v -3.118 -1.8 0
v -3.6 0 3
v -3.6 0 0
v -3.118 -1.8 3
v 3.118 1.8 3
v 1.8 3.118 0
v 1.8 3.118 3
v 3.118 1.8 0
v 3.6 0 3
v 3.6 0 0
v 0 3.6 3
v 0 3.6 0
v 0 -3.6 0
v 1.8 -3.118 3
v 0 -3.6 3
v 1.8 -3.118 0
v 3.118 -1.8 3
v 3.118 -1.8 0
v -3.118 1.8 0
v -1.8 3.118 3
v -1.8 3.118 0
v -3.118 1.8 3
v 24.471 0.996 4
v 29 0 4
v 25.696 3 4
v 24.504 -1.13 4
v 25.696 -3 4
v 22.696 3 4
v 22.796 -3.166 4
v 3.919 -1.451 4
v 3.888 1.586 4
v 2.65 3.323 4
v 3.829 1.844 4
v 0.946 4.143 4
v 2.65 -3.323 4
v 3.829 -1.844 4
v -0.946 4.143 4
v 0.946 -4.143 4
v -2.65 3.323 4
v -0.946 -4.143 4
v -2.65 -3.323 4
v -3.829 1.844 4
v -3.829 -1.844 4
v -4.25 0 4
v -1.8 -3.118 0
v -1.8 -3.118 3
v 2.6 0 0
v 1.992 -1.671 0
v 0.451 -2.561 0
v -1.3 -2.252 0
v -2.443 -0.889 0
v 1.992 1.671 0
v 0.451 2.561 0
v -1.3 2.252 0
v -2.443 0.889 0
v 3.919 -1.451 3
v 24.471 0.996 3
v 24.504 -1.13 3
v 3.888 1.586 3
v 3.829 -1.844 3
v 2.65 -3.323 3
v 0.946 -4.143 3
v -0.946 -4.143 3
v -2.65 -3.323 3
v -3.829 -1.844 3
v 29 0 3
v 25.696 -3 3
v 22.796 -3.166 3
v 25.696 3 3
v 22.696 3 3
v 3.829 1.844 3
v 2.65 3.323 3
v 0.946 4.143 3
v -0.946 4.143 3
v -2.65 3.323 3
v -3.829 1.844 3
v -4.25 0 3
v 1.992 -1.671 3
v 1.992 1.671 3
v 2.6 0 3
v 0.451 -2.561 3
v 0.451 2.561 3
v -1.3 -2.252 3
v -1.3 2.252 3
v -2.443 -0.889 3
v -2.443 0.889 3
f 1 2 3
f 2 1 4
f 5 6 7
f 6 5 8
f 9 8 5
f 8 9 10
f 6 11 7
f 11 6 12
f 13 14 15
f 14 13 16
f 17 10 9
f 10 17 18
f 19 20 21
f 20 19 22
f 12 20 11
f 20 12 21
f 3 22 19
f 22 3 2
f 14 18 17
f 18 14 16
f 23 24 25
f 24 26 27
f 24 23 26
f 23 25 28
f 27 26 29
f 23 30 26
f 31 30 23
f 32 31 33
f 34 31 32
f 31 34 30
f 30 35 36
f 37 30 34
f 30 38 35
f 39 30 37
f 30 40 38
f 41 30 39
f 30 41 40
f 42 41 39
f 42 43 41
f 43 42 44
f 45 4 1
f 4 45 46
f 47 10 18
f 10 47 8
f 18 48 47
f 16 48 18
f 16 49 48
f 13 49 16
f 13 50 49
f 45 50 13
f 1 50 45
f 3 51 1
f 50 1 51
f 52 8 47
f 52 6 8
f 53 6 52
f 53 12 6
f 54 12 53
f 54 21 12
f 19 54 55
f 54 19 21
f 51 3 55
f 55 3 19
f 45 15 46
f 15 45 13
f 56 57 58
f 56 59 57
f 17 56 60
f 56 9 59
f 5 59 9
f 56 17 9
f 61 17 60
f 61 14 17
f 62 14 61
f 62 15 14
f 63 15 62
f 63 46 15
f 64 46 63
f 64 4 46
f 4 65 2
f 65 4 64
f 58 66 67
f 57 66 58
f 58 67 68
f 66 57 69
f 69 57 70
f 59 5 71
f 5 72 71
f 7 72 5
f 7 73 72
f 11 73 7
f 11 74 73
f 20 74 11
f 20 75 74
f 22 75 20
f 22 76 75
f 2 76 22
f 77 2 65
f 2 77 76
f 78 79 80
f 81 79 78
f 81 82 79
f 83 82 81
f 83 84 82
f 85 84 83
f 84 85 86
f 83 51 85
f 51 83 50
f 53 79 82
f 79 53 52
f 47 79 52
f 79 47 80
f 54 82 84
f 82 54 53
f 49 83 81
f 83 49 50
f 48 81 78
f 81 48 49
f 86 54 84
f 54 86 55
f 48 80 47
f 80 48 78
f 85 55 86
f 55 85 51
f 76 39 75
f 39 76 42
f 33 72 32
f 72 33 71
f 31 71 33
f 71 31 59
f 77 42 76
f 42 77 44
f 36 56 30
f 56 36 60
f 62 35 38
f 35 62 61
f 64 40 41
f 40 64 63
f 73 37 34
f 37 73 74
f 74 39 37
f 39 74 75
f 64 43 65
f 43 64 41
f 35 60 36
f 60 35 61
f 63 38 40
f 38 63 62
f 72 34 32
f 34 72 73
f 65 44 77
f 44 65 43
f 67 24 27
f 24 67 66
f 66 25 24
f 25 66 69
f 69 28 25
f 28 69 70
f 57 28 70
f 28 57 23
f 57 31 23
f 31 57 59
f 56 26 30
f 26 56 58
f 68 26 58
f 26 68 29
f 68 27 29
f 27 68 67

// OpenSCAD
difference(){
cylinder(4,d=7.2);
translate([0,0,-1])cylinder(4,d=5.2);
}

translate([0,0,3]) cylinder(1,d=8.5);

translate([-1,-3,3.5]) linear_extrude(height = 1, center = true, convexity = 10) import (file = "pfeil.dxf");
